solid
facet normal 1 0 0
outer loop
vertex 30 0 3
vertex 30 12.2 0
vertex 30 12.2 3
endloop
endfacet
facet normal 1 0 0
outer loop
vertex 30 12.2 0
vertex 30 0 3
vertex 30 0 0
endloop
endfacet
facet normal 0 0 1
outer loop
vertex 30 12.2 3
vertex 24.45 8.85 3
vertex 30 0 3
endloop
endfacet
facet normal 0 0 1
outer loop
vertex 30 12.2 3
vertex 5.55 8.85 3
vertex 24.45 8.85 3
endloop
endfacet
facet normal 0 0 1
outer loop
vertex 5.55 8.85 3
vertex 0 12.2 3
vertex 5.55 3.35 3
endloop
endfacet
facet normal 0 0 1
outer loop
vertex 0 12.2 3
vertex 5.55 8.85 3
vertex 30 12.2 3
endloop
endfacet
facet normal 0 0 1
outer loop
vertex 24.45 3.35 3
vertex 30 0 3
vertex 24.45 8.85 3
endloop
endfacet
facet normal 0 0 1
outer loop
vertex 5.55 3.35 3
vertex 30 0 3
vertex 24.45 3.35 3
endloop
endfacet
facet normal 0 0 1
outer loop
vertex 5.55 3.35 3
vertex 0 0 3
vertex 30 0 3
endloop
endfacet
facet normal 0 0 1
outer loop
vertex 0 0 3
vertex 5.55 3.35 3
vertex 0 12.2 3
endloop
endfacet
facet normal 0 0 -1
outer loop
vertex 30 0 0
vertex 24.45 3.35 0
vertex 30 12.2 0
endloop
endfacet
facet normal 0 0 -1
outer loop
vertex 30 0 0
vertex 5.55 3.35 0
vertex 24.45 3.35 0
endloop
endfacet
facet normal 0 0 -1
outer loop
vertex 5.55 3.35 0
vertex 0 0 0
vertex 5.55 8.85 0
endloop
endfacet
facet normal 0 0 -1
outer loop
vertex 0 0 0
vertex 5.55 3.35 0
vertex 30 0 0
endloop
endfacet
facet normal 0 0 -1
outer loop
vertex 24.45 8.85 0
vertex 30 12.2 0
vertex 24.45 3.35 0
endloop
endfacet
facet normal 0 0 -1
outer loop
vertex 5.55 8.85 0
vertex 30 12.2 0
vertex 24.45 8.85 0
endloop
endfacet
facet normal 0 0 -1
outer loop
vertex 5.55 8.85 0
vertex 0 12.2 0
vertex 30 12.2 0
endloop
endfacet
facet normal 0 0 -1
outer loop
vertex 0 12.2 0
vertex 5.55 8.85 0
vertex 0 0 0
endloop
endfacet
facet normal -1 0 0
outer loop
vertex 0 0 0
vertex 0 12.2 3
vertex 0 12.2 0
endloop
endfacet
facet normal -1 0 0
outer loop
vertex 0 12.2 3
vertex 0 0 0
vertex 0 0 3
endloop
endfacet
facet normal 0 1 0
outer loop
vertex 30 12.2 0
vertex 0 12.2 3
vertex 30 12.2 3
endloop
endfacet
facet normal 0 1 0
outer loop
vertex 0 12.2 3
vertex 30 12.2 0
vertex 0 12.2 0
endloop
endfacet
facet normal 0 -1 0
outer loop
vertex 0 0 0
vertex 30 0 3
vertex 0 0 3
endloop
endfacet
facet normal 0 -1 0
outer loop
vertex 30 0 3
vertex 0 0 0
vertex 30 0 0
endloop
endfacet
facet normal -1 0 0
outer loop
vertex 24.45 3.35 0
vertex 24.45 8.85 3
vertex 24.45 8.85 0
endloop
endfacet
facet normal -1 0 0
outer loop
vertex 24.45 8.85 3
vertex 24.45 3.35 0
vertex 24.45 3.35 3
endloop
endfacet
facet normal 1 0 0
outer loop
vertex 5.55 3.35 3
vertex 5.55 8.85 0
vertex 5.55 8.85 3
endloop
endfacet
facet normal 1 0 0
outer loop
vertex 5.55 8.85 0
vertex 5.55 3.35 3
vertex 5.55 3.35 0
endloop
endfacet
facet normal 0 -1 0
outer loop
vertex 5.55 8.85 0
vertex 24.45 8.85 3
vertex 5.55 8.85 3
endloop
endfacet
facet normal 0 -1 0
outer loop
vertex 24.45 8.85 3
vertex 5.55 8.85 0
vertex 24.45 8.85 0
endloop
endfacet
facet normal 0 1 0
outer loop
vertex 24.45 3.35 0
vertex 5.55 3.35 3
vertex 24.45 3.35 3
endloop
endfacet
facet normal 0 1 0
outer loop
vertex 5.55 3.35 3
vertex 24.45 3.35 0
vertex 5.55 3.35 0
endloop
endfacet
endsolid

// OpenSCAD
difference() {
	cube([30, 12.2, 3]);
	translate([5.55, (12.2 - 5.5) / 2, 0]) {
		cube([18.9, 5.5, 3]);
	}
}
